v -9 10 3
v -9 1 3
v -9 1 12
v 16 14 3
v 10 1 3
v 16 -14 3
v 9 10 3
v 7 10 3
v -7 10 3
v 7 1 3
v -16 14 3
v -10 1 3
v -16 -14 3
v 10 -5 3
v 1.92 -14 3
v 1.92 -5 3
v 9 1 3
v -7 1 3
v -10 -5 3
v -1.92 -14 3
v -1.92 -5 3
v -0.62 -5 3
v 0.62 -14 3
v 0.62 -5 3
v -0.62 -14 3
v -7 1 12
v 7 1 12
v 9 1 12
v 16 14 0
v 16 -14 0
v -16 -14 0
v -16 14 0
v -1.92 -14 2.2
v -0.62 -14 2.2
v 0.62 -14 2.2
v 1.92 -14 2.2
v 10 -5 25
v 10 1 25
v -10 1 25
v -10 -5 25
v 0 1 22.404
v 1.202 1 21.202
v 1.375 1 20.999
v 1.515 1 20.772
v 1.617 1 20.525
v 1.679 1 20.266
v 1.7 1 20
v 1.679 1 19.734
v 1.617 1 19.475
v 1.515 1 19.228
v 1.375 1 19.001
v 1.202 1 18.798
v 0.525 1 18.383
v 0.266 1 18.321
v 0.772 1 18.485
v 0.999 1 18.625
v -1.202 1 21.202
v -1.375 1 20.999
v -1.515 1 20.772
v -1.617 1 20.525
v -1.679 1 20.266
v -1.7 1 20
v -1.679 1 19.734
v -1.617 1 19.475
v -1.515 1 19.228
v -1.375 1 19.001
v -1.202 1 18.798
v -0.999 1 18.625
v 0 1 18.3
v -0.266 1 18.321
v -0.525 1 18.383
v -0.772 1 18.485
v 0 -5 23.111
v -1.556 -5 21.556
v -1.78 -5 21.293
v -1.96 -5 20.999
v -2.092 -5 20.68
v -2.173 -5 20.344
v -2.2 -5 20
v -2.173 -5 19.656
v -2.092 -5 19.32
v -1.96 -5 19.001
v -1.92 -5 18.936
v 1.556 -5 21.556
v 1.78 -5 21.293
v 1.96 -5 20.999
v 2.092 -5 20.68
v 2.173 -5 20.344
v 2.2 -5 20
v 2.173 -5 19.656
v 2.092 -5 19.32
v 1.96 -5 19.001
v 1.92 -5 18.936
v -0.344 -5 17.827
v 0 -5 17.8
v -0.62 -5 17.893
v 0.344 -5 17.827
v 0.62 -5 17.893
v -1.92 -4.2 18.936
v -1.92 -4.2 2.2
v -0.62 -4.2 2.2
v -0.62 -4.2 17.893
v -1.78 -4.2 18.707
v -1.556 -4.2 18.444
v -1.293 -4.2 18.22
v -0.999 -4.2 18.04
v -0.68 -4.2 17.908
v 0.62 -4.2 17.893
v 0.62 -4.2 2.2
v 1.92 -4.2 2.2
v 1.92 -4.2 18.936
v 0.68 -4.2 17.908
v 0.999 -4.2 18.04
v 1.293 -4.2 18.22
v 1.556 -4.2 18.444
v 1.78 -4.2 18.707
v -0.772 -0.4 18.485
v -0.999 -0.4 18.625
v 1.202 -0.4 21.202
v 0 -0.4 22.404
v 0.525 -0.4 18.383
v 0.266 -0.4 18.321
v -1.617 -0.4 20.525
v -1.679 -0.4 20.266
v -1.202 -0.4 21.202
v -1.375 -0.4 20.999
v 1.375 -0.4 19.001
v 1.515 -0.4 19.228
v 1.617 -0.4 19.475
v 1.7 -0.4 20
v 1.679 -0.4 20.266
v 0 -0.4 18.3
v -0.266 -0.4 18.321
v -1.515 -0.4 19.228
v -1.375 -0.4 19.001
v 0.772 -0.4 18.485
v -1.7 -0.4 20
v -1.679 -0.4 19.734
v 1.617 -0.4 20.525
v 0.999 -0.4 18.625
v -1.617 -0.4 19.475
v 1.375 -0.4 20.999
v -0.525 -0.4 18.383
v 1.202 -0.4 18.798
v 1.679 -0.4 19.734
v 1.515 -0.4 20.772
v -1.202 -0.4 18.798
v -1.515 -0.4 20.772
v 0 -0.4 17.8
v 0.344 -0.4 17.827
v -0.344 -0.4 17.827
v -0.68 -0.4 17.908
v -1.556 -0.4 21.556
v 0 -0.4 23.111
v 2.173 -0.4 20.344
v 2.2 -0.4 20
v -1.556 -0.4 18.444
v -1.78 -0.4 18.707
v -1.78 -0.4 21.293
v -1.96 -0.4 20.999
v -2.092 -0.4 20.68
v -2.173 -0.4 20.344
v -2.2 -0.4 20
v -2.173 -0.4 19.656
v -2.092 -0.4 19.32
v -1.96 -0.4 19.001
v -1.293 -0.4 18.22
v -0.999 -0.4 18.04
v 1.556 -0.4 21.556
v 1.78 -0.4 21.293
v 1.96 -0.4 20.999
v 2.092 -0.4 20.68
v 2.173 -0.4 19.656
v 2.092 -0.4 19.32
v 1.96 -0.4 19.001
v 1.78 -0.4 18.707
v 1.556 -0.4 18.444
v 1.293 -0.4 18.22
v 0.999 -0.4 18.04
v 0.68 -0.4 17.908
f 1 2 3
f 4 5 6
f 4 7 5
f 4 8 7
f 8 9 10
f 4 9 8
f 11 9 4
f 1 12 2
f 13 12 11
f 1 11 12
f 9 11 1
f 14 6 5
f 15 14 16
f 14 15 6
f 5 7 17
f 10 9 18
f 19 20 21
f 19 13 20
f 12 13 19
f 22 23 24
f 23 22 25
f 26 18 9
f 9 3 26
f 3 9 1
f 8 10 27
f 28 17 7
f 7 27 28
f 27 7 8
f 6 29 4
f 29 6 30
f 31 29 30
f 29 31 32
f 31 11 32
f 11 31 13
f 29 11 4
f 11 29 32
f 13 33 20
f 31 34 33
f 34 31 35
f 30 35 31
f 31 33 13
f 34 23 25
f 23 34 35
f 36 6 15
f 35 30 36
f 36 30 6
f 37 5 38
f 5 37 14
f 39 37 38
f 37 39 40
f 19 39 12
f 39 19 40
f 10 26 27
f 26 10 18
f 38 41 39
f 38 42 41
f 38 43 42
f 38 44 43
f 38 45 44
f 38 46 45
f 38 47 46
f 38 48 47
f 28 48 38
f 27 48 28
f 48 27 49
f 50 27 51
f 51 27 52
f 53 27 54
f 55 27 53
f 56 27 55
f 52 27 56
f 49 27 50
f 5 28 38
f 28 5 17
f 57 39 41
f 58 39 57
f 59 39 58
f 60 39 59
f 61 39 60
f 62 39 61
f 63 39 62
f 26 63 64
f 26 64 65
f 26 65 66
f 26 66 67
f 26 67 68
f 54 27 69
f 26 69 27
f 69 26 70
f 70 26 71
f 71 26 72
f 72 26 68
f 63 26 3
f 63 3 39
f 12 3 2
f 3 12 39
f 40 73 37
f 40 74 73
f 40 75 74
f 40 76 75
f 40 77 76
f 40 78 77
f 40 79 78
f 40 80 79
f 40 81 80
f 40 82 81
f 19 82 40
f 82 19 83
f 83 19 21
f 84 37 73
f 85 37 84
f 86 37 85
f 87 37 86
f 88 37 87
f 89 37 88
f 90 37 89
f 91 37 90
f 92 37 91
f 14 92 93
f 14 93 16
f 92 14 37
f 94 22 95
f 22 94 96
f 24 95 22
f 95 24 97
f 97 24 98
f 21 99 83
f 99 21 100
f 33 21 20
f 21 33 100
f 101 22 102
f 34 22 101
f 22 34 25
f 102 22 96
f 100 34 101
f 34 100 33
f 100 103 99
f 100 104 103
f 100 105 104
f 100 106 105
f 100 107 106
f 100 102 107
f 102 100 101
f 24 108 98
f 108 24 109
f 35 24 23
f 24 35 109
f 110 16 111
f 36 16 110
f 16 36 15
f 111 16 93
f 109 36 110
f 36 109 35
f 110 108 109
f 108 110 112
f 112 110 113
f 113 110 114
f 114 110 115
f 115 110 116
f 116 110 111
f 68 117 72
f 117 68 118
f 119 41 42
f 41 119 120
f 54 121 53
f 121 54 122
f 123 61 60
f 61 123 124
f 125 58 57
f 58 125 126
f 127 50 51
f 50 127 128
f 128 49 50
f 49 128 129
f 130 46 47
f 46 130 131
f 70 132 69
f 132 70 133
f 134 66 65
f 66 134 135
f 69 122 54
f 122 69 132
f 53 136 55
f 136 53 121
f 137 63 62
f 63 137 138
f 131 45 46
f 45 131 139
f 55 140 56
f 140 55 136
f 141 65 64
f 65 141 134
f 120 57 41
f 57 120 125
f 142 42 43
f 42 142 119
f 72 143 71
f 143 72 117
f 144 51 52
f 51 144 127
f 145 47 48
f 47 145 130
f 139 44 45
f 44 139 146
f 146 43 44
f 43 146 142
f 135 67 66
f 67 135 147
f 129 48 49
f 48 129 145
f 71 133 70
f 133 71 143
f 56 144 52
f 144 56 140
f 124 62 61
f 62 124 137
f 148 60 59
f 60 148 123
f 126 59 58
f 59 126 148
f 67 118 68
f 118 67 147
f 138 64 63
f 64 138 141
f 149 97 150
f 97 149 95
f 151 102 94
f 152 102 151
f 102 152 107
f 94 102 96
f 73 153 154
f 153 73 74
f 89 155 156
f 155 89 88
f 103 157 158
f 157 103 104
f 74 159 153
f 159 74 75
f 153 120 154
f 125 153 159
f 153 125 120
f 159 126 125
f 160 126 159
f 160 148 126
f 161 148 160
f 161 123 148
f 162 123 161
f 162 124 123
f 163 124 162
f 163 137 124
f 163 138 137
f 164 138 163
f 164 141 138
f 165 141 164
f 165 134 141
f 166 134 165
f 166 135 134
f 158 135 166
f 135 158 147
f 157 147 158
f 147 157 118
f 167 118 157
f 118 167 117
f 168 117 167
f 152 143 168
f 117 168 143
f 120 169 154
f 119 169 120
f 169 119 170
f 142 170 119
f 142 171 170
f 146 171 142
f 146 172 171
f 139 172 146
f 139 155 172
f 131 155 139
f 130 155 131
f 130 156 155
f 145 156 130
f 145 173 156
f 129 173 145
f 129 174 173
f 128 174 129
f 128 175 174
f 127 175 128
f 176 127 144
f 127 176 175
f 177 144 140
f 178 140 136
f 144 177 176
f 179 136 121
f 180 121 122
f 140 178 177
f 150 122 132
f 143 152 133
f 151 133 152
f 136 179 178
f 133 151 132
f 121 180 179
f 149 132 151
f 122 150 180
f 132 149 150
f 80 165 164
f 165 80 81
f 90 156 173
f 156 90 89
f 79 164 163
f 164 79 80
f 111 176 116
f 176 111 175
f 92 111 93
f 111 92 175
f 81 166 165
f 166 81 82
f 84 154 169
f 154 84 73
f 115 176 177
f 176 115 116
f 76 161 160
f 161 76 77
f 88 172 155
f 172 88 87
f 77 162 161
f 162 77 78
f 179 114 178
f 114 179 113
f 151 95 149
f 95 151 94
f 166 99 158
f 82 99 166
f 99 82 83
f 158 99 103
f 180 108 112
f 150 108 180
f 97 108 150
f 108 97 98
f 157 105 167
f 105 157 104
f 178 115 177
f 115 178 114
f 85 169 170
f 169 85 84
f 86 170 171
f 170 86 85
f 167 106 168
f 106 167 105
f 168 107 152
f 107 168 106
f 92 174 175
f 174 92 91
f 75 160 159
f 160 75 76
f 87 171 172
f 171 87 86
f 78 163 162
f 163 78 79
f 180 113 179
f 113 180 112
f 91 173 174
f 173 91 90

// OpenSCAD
// Units: mm. Printable: source_stand, detector_cradle. Other selectors are illustrative proxies.
// Direct grooves, uniform recessed-seat upright, square wall/base junction.
$fn=40;
part="source_stand";
axis_z=20; foot_t=3; bore_d=3.4;
// Uniform wall, no lower block/heel. Front plane remains Y=+1.
plate_t=6; plate_front_y=1; wall_rear_y=plate_front_y-plate_t;
seat_land_t=1.4; flange_seat_y=plate_front_y-seat_land_t;
flange_clearance_d=4.4;
// Independent rectangular open channels, deliberately square at their junction.
lead_pitch=2.54; lead_slot_w=1.3; wall_groove_depth=0.8; base_groove_depth=0.8;
wall_floor_y=wall_rear_y+wall_groove_depth;
base_floor_z=foot_t-base_groove_depth;
// Unmeasured hardware PROXIES. The guide's 2 mm clearance is not a radius spec.
lead_proxy_d=0.8; flange_proxy_t=0.5; flange_proxy_d=3.85;
flange_axial_allowance=1; straight_min_design=2;
upper_bend_r=1.2; base_bend_r=1.2; arc_step=2;
seal_proxy_y=flange_seat_y-flange_proxy_t;
lead_wall_y=wall_floor_y-lead_proxy_d/2;
lead_base_z=base_floor_z+lead_proxy_d/2;
upper_start_y=lead_wall_y+upper_bend_r;
straight_near_seal=seal_proxy_y-upper_start_y;
base_cy=lead_wall_y-base_bend_r; base_cz=lead_base_z+base_bend_r;
assert(lead_pitch-lead_slot_w>=1.2,"Keep separating web >=1.2");
assert(plate_t-wall_groove_depth>=1.2 && seat_land_t>=1.2,"Keep wall/seat material");
assert(base_floor_z>=2,"Keep substantial base floor");
assert(flange_seat_y-flange_axial_allowance-upper_start_y>=straight_min_design-0.001,
       "Increase uniform wall thickness for actual flange/straight/bend requirements");
assert(flange_clearance_d>=4.1+0.3-0.001,"Flange loading clearance");
assert(lead_slot_w>lead_proxy_d && wall_groove_depth>=lead_proxy_d,"Slip groove envelope");
slot_front=-13; slot_rear=7; floor_z=8;
datum_inner_x=22.5; datum_outer_x=25;
datum_y_min=-6; datum_y_max=-2; datum_top_z=14;
assert(datum_inner_x>22,"Body side clearance");
assert(datum_y_min > -8.4 && datum_y_max < 2.4,"Panel corridors stay open");
assert(axis_z==floor_z+15-3,"V11 aperture height mismatch");
assert(slot_front < -12.4 && slot_rear > 6.4,"Full shell clearance");
module box(a,b){translate(a) cube(b-a);}
module across_x(points,half_w){
 multmatrix([[0,0,1,0],[1,0,0,0],[0,1,0,0],[0,0,0,1]])
  linear_extrude(2*half_w,center=true) polygon(points);
}
module roofed_circle(d,y0,y1){
 translate([0,(y0+y1)/2,axis_z]) rotate([90,0,0])
  linear_extrude(y1-y0,center=true)
   polygon(concat([for(a=[135:9:405]) [d/2*cos(a),d/2*sin(a)]],[[0,d/2*sqrt(2)]]));
}
module direct_groove(x){
 // One L-shaped cut: exact square root at [wall_floor_y,base_floor_z].
 // Upper end opens fully into the LED loading recess; no blind roof/lip.
 translate([x,0,0]) across_x([
  [-14.1,base_floor_z],[wall_floor_y,base_floor_z],
  [wall_floor_y,axis_z],[wall_rear_y-0.1,axis_z],
  [wall_rear_y-0.1,foot_t+0.1],[-14.1,foot_t+0.1]],lead_slot_w/2);
}
module source_stand(){
 difference(){
  union(){
   box([-16,-14,0],[16,14,foot_t]);
   box([-10,wall_rear_y,foot_t],[10,plate_front_y,25]);
   for(x=[-9,7]) translate([x,0,0]) rotate([90,0,90])
    linear_extrude(2) polygon([[0,foot_t],[10,foot_t],[0,13]]);
  }
  roofed_circle(bore_d,wall_rear_y-0.1,plate_front_y+0.1);
  // Rear-loaded seat; flange front rests on the 1.4 mm bore land at Y=-0.4.
  roofed_circle(flange_clearance_d,wall_rear_y-0.1,flange_seat_y);
  for(x=[-lead_pitch/2,lead_pitch/2]) direct_groove(x);
 }
}
// Two ordinary 90-degree conductor bends. CAD junction remains square.
function lead_route(x)=concat([[x,seal_proxy_y,axis_z]],
 [for(a=[0:arc_step:90])
  [x,upper_start_y-upper_bend_r*sin(a),axis_z-upper_bend_r+upper_bend_r*cos(a)]],
 [[x,lead_wall_y,base_cz]],
 [for(a=[arc_step:arc_step:90])
  [x,base_cy+base_bend_r*cos(a),base_cz-base_bend_r*sin(a)]],
 [[x,-14,lead_base_z]]);
module tube(points,d){
 // A simple swept proxy mesh keeps previews fast; no hardware STL is exported.
 n=16; m=len(points);
 pts=[for(i=[0:m-1]) let(
  v=points[min(i+1,m-1)]-points[max(i-1,0)],
  normal=[0,-v[2]/norm(v),v[1]/norm(v)])
  for(j=[0:n-1]) points[i]+[d/2*cos(360*j/n),0,0]+normal*d/2*sin(360*j/n)];
 faces=concat([[for(j=[n-1:-1:0]) j]],
  [for(i=[0:m-2]) for(j=[0:n-1]) each
   [[i*n+j,i*n+(j+1)%n,(i+1)*n+(j+1)%n],
    [i*n+j,(i+1)*n+(j+1)%n,(i+1)*n+j]]],
  [[for(j=[0:n-1]) (m-1)*n+j]]);
 polyhedron(pts,faces,convexity=10);
}
module led_proxy(){
 color("crimson") translate([0,flange_seat_y,axis_z]) rotate([-90,0,0]) cylinder(d=3,h=4.8);
 color("darkred") translate([0,seal_proxy_y,axis_z]) rotate([-90,0,0])
  cylinder(d=flange_proxy_d,h=flange_proxy_t);
 for(s=[-1,1]) color(s<0 ? "gold" : "silver") tube(lead_route(s*lead_pitch/2),lead_proxy_d);
}
module source_route_preview(){color("seagreen") source_stand(); led_proxy();}
module source_section_preview(){
 // Cut through positive lead center. Section is illustrative, not another part.
 color("seagreen") intersection(){source_stand();box([-17,-20,-1],[lead_pitch/2,15,26]);}
 led_proxy();
}
module source_entry_preview(){
 // Magnified cutaway of the real modeled seat/entry; hardware is illustrative.
 intersection(){source_section_preview();box([-17,-10,16],[17,8,25.5]);}
}
module detector_cradle(){
 union(){
  box([-25,-19,0],[25,13,floor_z]);
  box([-25,-19,floor_z-0.1],[25,slot_front,14]);
  box([-25,slot_rear,floor_z-0.1],[25,13,14]);
  // Fixed body-only datum tabs; 0.5 mm nominal gap, no clamping preload.
  for(side=[-1,1]) scale([side,1,1])
   box([datum_inner_x,datum_y_min,floor_z-0.1],
       [datum_outer_x,datum_y_max,datum_top_z]);
 }
}
// PROXY ONLY: V11 complete shell, shutter and cover envelopes. Not printable jig.
// Exact datum transform: original x,y,z -> world -x,-z,23-y.
module v11_pose(){translate([0,0,23]) rotate([0,180,0]) rotate([90,0,0]) children();}
module proxy_v11(offset=0){v11_pose(){
 color("slategray") difference(){
  union(){box([-22,-15,0],[22,15,8]);
   for(y=[-15,11.8]) box([-22,y,-6.4],[22,y+3.2,12.4]);}
  for(x=[-5,5]) translate([x,3,-7]) cylinder(d=2,h=21);
 }
 color("orange") translate([offset,0,0]) difference(){
  box([-34,-13,8.4],[22,13,10.4]);
  for(x=[-5,5]) translate([x,3,8]) cylinder(d=4,h=3);
 }
 color("gold") box([-28,-13,-4.4],[21,13,-2.4]);
 // Upward wire proxies, no polarity or channel assignment.
 color("silver") for(x=[-6.27,-3.73,3.73,6.27])
  box([x-0.25,-24,-1.4],[x+0.25,-14,-0.8]);
}}
module assembly_preview(){
 color([0.6,0.5,0.35,0.25]) box([-65,-65,-2],[65,35,0]); // board proxy only
 color("teal") detector_cradle();
 proxy_v11();
 // Source plate at Y=-48: illustrative spacing, actual lens tip unmeasured.
 translate([0,-48,0]){
  color("seagreen") source_stand();
  led_proxy();
 }
 color([1,0,0,0.4]) translate([0,-44,axis_z]) rotate([-90,0,0]) cylinder(d=0.35,h=31);
}
if(part=="source_stand") source_stand();
else if(part=="detector_cradle") detector_cradle();
else if(part=="assembly") assembly_preview();
else if(part=="source_route") source_route_preview();
else if(part=="section") source_section_preview();
else if(part=="entry") source_entry_preview();
else assert(false,"Unknown part");
